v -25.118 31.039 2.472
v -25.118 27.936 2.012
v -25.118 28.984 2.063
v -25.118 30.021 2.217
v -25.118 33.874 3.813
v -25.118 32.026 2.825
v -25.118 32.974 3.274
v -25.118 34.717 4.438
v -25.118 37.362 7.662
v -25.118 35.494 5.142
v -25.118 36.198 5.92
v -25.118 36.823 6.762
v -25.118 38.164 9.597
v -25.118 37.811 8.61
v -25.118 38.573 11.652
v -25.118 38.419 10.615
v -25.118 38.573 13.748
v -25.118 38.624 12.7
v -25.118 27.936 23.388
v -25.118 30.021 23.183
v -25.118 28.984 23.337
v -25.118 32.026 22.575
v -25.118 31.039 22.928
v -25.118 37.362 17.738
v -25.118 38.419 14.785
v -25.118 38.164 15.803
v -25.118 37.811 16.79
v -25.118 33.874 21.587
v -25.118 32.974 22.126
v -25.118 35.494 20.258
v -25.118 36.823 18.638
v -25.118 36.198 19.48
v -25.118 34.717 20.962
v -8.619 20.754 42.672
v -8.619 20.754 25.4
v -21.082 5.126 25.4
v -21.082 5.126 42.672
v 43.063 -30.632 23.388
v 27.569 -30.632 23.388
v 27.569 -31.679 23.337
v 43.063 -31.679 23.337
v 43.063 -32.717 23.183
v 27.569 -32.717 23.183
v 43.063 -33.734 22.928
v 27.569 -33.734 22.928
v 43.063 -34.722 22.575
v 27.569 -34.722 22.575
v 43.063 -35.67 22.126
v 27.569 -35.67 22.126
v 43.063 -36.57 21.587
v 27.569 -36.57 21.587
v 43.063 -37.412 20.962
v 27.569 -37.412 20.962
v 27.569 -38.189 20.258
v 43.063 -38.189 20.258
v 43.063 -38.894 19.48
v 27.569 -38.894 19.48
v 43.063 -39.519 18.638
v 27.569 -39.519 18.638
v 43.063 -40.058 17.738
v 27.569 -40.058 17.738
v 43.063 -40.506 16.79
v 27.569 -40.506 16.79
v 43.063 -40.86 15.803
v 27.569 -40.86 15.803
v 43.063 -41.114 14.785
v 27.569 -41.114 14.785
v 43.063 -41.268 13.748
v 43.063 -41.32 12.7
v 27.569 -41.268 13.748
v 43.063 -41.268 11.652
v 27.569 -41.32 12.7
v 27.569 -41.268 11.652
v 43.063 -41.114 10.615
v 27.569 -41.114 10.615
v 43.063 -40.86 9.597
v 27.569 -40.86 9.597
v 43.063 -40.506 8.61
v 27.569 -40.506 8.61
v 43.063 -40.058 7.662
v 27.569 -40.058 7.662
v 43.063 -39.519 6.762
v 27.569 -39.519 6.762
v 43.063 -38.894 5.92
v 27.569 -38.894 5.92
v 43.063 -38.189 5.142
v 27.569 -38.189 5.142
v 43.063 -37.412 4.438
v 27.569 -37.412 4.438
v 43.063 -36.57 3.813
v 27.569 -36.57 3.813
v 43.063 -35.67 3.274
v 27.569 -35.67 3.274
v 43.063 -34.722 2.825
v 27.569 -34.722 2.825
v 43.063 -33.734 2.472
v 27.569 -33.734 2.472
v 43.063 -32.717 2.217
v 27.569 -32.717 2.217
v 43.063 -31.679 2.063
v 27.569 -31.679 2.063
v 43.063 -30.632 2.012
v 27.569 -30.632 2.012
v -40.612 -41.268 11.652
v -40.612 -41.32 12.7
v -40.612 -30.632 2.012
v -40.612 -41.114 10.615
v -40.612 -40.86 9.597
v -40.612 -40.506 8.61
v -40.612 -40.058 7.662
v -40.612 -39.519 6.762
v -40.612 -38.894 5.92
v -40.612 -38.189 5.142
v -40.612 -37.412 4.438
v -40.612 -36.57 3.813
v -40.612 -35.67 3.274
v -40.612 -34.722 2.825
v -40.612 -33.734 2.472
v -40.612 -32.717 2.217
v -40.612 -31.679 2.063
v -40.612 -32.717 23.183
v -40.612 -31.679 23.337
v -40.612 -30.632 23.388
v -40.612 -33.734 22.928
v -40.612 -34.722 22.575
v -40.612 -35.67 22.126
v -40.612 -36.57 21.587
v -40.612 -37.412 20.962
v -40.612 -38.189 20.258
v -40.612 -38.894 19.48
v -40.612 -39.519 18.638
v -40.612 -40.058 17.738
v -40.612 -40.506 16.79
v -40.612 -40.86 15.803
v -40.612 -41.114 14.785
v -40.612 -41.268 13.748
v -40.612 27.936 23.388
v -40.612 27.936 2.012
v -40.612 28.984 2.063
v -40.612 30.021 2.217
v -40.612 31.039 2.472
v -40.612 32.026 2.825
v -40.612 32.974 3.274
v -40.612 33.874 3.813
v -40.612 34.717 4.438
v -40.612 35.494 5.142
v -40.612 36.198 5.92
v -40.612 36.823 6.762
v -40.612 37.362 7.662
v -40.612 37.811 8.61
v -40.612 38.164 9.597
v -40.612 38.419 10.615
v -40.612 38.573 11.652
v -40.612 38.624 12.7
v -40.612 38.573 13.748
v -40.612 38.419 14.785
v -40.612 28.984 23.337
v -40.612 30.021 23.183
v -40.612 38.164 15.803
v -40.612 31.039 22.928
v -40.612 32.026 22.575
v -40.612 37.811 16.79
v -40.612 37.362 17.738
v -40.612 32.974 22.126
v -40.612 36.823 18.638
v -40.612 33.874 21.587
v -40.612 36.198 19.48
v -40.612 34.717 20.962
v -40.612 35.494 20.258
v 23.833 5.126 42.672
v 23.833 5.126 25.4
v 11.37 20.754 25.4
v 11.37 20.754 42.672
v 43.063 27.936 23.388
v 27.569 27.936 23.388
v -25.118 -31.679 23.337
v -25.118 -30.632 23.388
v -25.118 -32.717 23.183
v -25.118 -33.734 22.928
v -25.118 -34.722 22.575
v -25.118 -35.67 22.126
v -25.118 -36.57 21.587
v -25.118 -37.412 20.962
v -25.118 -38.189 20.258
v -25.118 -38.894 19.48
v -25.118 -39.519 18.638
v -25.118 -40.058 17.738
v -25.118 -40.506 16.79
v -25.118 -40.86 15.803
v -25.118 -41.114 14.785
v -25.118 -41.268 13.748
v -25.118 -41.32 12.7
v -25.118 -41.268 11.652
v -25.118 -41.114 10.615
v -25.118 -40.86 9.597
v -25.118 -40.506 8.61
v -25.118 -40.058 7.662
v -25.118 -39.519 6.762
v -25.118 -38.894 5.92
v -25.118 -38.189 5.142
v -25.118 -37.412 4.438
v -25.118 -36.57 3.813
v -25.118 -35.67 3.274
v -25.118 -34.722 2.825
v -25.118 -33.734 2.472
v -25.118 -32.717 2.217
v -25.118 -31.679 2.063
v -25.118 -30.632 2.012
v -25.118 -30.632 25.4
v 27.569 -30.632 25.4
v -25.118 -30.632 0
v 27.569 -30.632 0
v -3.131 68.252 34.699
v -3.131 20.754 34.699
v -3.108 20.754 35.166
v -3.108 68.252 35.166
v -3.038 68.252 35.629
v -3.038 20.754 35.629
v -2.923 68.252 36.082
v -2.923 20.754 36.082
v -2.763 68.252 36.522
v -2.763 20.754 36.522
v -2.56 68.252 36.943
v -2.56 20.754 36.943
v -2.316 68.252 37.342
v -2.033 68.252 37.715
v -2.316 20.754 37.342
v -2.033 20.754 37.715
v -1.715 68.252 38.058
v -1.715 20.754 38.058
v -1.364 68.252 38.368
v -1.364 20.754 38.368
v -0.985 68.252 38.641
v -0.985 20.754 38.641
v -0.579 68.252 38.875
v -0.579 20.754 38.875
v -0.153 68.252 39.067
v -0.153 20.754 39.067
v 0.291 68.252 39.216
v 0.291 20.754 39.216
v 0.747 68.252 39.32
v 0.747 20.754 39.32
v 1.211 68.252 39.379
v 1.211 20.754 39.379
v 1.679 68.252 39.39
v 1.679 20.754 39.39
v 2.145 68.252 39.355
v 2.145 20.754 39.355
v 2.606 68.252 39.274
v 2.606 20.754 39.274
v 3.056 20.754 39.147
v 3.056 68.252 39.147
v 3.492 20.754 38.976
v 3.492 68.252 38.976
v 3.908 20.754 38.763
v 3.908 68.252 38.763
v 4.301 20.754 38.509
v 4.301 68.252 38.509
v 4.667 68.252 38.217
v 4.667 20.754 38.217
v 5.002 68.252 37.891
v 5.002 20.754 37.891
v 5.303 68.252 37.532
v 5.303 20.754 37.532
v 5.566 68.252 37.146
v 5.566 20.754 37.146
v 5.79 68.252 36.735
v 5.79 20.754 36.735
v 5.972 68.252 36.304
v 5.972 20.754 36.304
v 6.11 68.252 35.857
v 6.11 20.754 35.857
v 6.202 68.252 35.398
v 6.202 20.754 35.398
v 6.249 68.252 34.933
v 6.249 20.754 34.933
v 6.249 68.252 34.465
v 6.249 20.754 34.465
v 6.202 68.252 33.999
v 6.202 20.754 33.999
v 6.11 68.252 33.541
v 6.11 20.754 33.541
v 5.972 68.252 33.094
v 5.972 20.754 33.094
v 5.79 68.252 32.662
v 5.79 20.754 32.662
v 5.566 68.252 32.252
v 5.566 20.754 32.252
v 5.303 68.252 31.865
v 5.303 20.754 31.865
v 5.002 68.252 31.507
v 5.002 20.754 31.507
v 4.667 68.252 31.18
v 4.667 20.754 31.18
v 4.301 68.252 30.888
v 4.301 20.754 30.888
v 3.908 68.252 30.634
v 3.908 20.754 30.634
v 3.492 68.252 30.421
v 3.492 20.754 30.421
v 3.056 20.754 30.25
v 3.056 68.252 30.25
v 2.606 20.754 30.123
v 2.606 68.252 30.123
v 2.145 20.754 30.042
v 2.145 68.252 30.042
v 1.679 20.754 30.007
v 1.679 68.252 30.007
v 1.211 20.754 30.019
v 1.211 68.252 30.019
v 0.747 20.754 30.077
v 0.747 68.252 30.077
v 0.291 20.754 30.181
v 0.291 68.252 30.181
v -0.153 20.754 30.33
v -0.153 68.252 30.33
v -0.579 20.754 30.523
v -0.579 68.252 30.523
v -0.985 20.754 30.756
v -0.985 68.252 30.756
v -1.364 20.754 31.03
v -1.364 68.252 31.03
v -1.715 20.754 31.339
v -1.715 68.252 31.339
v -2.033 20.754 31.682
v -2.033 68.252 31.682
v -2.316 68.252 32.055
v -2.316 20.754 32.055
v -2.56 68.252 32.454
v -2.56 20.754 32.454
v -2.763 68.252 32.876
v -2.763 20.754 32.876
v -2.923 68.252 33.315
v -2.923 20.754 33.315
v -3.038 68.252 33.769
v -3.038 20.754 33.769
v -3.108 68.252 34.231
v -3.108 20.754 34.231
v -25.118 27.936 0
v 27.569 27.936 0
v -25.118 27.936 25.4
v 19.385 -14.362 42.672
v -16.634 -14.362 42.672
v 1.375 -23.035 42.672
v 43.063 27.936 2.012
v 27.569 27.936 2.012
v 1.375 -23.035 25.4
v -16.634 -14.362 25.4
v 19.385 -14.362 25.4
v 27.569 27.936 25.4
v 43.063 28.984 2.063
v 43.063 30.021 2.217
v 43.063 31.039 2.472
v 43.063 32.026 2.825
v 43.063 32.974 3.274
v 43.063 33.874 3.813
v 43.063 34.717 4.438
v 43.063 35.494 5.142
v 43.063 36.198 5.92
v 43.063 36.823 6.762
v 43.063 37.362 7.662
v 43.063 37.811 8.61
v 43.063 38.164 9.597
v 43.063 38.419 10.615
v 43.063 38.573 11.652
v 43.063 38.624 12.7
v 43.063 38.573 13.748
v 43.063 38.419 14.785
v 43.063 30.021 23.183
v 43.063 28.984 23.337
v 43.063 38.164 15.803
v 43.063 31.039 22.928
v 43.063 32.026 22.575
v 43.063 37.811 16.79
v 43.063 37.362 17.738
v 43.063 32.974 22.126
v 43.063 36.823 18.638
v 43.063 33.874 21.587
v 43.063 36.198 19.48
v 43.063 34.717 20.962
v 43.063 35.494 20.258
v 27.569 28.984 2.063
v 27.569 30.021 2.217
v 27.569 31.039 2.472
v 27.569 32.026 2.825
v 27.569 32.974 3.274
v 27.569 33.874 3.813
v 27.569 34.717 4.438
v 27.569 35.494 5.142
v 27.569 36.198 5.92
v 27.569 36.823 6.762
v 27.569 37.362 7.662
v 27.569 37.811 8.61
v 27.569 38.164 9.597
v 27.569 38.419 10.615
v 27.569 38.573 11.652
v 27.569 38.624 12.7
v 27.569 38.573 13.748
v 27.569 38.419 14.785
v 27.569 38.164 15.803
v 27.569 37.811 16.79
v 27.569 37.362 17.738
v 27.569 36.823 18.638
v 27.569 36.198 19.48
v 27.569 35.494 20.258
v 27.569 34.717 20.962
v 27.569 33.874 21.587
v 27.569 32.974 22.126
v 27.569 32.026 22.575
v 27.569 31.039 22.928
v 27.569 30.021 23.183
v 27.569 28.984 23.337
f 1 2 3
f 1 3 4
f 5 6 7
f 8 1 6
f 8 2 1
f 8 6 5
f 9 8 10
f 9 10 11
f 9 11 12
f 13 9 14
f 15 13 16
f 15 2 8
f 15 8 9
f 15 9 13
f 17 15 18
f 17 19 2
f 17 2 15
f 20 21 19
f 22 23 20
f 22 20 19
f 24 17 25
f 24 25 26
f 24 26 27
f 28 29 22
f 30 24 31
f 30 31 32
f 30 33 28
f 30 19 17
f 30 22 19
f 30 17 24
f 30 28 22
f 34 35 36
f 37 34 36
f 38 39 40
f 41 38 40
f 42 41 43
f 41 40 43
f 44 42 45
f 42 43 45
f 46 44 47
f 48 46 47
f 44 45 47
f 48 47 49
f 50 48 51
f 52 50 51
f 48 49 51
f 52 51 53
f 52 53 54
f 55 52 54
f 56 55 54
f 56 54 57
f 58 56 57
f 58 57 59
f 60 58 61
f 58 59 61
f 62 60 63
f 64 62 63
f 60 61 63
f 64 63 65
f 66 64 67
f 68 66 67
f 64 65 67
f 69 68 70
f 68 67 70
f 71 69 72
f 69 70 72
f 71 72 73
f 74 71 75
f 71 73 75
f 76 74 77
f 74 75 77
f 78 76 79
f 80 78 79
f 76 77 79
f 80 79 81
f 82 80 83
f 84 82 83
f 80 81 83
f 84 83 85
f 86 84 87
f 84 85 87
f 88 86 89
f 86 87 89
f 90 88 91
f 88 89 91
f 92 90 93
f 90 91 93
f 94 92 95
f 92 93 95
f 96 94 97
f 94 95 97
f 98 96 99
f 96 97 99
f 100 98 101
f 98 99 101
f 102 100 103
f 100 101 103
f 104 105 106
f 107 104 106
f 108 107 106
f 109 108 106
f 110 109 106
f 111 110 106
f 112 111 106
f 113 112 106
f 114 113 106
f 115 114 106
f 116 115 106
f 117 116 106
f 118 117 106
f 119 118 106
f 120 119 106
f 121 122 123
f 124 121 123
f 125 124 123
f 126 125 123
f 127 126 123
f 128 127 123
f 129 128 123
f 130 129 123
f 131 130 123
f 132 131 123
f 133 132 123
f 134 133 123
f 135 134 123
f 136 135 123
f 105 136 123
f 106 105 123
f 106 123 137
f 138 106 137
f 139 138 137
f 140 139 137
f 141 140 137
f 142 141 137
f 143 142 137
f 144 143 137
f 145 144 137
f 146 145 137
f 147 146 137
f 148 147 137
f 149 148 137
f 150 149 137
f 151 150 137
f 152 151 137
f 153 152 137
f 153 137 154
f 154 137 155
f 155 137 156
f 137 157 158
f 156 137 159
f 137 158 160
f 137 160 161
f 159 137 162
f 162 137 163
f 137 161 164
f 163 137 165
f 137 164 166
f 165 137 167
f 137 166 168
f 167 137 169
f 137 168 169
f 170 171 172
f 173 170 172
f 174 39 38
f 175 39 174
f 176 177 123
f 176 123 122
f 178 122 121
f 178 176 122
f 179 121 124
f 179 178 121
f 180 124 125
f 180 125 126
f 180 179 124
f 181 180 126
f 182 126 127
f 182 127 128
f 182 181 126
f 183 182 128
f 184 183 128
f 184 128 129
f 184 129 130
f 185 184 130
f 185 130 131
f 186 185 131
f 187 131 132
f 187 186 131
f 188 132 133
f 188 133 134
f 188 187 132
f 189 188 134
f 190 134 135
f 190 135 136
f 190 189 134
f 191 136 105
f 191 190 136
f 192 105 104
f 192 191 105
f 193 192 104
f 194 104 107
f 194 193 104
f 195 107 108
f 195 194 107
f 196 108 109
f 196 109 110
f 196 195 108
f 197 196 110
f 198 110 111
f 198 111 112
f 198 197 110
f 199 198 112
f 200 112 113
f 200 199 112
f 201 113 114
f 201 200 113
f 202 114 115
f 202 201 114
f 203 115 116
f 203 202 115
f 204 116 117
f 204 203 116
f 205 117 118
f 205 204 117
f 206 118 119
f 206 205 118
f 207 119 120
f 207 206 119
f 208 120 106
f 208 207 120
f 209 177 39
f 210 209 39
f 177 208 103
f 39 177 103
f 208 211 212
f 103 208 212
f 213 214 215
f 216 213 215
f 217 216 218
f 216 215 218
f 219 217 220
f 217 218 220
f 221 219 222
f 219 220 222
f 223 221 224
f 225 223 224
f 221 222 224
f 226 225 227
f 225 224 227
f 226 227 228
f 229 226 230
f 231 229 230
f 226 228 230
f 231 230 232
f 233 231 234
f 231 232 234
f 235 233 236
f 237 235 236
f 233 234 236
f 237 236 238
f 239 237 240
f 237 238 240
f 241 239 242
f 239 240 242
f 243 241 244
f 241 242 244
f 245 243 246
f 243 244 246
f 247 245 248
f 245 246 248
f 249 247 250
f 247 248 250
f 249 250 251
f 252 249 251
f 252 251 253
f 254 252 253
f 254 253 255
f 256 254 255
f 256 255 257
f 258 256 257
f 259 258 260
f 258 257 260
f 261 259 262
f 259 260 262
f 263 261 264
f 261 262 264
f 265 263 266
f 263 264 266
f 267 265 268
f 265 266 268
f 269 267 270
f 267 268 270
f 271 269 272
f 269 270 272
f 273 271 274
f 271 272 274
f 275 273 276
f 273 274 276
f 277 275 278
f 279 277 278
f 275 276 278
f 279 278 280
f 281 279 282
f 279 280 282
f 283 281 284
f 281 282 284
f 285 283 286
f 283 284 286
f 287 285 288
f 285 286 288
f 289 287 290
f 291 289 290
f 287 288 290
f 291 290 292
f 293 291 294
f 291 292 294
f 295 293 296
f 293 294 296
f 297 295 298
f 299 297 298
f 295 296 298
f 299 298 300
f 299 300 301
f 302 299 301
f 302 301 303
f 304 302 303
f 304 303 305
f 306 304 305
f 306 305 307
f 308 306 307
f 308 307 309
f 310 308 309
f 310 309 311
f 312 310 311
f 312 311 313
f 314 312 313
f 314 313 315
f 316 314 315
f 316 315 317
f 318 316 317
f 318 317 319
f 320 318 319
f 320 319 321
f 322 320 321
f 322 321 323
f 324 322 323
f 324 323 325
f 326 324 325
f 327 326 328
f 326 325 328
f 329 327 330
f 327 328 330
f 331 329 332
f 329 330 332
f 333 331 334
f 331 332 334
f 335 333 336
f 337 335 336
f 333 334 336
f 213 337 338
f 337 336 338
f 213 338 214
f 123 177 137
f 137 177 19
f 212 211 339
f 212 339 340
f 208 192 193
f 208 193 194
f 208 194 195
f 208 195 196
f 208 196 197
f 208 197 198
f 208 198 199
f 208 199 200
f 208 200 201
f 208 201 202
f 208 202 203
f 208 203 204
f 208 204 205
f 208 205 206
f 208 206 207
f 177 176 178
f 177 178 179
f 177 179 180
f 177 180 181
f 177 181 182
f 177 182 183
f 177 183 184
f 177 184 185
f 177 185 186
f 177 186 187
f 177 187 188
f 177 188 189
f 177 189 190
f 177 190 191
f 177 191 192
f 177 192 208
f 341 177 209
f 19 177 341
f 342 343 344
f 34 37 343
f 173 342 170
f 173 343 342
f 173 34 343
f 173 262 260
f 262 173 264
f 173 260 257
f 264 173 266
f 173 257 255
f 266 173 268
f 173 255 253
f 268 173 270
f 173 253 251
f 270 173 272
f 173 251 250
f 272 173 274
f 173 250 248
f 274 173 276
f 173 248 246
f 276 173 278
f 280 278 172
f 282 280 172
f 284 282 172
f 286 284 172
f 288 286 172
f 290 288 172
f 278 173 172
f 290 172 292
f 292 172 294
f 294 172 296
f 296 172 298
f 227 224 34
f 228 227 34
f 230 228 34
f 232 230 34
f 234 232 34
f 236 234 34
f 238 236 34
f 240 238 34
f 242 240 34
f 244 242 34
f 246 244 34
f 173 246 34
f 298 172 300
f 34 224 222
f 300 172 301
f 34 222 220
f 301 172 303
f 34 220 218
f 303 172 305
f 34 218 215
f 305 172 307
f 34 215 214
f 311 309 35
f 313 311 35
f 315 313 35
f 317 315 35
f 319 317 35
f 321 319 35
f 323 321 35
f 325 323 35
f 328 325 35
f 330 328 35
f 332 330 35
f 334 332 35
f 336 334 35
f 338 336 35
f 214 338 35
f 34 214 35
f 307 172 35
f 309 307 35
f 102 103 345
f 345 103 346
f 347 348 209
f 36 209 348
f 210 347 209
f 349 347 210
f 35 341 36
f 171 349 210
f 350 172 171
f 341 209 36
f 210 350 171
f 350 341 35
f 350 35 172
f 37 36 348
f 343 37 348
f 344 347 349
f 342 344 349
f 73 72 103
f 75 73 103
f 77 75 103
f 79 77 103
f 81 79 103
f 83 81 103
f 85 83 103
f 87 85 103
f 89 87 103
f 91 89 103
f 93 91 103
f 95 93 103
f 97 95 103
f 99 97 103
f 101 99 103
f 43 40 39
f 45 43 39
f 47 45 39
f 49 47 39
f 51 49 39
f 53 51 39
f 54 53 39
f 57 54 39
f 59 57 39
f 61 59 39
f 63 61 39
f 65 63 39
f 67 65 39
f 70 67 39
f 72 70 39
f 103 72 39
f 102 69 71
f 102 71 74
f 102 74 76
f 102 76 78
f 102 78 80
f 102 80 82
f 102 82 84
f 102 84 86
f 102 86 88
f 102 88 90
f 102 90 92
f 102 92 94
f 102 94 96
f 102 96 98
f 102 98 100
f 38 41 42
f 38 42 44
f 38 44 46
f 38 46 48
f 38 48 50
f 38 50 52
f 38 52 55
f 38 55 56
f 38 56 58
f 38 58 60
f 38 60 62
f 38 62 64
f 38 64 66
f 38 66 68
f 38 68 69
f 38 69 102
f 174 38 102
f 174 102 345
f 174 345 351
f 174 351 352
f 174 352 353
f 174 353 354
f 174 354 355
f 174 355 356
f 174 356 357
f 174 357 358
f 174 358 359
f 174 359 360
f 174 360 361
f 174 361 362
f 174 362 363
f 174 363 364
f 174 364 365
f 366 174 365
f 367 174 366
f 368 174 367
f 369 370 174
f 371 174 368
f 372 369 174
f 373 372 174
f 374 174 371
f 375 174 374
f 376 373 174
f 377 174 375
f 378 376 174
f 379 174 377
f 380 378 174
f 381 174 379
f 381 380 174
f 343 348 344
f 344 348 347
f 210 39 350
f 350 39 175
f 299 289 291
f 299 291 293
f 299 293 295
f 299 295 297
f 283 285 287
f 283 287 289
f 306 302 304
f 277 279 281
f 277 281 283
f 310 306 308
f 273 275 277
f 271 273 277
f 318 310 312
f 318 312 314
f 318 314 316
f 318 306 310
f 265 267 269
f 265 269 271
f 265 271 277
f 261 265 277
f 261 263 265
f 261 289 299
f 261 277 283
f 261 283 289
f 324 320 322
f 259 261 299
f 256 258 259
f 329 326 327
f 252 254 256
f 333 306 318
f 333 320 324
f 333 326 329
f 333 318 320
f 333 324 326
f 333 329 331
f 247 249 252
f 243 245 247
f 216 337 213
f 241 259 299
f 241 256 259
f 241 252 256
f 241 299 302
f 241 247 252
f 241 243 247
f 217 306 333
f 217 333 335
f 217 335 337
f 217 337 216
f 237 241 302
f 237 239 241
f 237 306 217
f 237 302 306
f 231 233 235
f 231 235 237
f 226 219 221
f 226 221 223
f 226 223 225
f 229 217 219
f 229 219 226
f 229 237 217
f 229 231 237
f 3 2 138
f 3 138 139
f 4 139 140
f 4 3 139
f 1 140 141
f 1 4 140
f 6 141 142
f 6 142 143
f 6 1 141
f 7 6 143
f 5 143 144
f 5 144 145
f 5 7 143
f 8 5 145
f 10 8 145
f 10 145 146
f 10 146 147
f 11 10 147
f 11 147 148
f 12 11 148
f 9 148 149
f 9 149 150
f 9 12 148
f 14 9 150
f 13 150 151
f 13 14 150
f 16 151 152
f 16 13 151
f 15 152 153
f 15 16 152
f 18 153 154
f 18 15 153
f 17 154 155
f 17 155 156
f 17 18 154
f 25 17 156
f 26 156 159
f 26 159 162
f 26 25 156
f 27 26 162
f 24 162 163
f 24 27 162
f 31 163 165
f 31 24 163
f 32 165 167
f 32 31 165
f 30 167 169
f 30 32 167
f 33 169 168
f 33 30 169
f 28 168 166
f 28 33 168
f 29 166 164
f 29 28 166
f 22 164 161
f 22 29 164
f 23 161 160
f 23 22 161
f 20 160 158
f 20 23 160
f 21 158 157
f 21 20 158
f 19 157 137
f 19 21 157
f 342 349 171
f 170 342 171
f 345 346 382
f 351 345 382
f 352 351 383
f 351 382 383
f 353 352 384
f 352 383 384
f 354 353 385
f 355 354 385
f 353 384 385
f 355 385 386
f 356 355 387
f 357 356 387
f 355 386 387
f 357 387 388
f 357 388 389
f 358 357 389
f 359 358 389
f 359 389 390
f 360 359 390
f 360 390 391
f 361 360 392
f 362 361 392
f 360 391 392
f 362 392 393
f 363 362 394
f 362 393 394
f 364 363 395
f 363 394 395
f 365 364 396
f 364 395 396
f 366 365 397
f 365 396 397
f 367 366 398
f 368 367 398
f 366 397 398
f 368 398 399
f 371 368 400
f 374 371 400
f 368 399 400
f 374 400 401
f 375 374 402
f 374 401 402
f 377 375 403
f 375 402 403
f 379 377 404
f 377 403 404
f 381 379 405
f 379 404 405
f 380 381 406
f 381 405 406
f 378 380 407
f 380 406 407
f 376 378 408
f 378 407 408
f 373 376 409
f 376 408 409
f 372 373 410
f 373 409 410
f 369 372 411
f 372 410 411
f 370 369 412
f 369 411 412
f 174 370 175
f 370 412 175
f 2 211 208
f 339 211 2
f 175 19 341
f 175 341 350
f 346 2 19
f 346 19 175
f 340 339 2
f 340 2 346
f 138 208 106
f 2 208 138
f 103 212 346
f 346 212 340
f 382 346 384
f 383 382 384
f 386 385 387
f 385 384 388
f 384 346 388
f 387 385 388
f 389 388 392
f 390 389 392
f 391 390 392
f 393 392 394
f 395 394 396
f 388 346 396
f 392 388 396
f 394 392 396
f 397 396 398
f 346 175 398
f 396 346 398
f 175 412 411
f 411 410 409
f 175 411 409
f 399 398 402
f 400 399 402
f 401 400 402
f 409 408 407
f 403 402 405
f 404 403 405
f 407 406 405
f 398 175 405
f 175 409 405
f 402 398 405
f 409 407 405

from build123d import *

# Parameters (mm, degrees)
F0_W     = 52.6865217835
F0_H     = 58.567808941
F1_DEPTH = 25.4
F2_W     = 58.567808941
F2_H     = 21.3762959349
F3_DEPTH = 15.494
F7_DEPTH = 17.272
F8_R     = 4.6929987143
F9_DEPTH = 47.498


with BuildPart() as f1:
    # F0 (on Top) → F1 (new body)
    with BuildSketch(Plane.XY):
        with Locations((1.2252675369, -1.3477941975)):
            Rectangle(F0_W, F0_H)
    extrude(amount=F1_DEPTH)

    # F2 (on face) → F3 (join)
    with BuildSketch(Plane.YZ.offset(27.5685284287)):
        with BuildLine():
            Line((-30.631698668, 2.0118520325), (-30.631698668, 23.3881479675))
            ThreePointArc((-30.631698668, 23.3881479675), (-41.3198466355, 12.7), (-30.631698668, 2.0118520325))
        make_face()
        with Locations((-1.3477941975, 12.7)):
            Rectangle(F2_W, F2_H)
        with BuildLine():
            ThreePointArc((27.936110273, 2.0118520325), (38.6242582405, 12.7), (27.936110273, 23.3881479675))
            Line((27.936110273, 23.3881479675), (27.936110273, 2.0118520325))
        make_face()
    extrude(amount=F3_DEPTH)

    # F5: F1 across plane


with BuildPart() as f1_1:
    add(f1.part)
    add(f1.part.mirror(Plane(origin=(1.2252675369, -1.3477941975, 18.5470369919), x_dir=(0, 1, 0), z_dir=(1, 0, 0))))

    # F6 (on face) → F7 (join)
    with BuildSketch(Plane.XY.offset(25.4)):
        Polygon((11.3696932765, 20.753711462), (-8.6192280958, 20.753711462), (-21.0821167216, 5.1257434326), (-16.6341632691, -14.3620139477), (1.3752325904, -23.0348818937), (19.3846284498, -14.3620139477), (23.8325819023, 5.1257434326), align=None)
    extrude(amount=F7_DEPTH)

    # F8 (on face) → F9 (join)
    with BuildSketch(Plane(origin=(0, 20.753711462, 0), x_dir=(-1, 0, 0), z_dir=(0, 1, 0))):
        with Locations((-1.5616653254, 34.6986874938)):
            Circle(F8_R)
    extrude(amount=F9_DEPTH)


solid = f1_1.part
